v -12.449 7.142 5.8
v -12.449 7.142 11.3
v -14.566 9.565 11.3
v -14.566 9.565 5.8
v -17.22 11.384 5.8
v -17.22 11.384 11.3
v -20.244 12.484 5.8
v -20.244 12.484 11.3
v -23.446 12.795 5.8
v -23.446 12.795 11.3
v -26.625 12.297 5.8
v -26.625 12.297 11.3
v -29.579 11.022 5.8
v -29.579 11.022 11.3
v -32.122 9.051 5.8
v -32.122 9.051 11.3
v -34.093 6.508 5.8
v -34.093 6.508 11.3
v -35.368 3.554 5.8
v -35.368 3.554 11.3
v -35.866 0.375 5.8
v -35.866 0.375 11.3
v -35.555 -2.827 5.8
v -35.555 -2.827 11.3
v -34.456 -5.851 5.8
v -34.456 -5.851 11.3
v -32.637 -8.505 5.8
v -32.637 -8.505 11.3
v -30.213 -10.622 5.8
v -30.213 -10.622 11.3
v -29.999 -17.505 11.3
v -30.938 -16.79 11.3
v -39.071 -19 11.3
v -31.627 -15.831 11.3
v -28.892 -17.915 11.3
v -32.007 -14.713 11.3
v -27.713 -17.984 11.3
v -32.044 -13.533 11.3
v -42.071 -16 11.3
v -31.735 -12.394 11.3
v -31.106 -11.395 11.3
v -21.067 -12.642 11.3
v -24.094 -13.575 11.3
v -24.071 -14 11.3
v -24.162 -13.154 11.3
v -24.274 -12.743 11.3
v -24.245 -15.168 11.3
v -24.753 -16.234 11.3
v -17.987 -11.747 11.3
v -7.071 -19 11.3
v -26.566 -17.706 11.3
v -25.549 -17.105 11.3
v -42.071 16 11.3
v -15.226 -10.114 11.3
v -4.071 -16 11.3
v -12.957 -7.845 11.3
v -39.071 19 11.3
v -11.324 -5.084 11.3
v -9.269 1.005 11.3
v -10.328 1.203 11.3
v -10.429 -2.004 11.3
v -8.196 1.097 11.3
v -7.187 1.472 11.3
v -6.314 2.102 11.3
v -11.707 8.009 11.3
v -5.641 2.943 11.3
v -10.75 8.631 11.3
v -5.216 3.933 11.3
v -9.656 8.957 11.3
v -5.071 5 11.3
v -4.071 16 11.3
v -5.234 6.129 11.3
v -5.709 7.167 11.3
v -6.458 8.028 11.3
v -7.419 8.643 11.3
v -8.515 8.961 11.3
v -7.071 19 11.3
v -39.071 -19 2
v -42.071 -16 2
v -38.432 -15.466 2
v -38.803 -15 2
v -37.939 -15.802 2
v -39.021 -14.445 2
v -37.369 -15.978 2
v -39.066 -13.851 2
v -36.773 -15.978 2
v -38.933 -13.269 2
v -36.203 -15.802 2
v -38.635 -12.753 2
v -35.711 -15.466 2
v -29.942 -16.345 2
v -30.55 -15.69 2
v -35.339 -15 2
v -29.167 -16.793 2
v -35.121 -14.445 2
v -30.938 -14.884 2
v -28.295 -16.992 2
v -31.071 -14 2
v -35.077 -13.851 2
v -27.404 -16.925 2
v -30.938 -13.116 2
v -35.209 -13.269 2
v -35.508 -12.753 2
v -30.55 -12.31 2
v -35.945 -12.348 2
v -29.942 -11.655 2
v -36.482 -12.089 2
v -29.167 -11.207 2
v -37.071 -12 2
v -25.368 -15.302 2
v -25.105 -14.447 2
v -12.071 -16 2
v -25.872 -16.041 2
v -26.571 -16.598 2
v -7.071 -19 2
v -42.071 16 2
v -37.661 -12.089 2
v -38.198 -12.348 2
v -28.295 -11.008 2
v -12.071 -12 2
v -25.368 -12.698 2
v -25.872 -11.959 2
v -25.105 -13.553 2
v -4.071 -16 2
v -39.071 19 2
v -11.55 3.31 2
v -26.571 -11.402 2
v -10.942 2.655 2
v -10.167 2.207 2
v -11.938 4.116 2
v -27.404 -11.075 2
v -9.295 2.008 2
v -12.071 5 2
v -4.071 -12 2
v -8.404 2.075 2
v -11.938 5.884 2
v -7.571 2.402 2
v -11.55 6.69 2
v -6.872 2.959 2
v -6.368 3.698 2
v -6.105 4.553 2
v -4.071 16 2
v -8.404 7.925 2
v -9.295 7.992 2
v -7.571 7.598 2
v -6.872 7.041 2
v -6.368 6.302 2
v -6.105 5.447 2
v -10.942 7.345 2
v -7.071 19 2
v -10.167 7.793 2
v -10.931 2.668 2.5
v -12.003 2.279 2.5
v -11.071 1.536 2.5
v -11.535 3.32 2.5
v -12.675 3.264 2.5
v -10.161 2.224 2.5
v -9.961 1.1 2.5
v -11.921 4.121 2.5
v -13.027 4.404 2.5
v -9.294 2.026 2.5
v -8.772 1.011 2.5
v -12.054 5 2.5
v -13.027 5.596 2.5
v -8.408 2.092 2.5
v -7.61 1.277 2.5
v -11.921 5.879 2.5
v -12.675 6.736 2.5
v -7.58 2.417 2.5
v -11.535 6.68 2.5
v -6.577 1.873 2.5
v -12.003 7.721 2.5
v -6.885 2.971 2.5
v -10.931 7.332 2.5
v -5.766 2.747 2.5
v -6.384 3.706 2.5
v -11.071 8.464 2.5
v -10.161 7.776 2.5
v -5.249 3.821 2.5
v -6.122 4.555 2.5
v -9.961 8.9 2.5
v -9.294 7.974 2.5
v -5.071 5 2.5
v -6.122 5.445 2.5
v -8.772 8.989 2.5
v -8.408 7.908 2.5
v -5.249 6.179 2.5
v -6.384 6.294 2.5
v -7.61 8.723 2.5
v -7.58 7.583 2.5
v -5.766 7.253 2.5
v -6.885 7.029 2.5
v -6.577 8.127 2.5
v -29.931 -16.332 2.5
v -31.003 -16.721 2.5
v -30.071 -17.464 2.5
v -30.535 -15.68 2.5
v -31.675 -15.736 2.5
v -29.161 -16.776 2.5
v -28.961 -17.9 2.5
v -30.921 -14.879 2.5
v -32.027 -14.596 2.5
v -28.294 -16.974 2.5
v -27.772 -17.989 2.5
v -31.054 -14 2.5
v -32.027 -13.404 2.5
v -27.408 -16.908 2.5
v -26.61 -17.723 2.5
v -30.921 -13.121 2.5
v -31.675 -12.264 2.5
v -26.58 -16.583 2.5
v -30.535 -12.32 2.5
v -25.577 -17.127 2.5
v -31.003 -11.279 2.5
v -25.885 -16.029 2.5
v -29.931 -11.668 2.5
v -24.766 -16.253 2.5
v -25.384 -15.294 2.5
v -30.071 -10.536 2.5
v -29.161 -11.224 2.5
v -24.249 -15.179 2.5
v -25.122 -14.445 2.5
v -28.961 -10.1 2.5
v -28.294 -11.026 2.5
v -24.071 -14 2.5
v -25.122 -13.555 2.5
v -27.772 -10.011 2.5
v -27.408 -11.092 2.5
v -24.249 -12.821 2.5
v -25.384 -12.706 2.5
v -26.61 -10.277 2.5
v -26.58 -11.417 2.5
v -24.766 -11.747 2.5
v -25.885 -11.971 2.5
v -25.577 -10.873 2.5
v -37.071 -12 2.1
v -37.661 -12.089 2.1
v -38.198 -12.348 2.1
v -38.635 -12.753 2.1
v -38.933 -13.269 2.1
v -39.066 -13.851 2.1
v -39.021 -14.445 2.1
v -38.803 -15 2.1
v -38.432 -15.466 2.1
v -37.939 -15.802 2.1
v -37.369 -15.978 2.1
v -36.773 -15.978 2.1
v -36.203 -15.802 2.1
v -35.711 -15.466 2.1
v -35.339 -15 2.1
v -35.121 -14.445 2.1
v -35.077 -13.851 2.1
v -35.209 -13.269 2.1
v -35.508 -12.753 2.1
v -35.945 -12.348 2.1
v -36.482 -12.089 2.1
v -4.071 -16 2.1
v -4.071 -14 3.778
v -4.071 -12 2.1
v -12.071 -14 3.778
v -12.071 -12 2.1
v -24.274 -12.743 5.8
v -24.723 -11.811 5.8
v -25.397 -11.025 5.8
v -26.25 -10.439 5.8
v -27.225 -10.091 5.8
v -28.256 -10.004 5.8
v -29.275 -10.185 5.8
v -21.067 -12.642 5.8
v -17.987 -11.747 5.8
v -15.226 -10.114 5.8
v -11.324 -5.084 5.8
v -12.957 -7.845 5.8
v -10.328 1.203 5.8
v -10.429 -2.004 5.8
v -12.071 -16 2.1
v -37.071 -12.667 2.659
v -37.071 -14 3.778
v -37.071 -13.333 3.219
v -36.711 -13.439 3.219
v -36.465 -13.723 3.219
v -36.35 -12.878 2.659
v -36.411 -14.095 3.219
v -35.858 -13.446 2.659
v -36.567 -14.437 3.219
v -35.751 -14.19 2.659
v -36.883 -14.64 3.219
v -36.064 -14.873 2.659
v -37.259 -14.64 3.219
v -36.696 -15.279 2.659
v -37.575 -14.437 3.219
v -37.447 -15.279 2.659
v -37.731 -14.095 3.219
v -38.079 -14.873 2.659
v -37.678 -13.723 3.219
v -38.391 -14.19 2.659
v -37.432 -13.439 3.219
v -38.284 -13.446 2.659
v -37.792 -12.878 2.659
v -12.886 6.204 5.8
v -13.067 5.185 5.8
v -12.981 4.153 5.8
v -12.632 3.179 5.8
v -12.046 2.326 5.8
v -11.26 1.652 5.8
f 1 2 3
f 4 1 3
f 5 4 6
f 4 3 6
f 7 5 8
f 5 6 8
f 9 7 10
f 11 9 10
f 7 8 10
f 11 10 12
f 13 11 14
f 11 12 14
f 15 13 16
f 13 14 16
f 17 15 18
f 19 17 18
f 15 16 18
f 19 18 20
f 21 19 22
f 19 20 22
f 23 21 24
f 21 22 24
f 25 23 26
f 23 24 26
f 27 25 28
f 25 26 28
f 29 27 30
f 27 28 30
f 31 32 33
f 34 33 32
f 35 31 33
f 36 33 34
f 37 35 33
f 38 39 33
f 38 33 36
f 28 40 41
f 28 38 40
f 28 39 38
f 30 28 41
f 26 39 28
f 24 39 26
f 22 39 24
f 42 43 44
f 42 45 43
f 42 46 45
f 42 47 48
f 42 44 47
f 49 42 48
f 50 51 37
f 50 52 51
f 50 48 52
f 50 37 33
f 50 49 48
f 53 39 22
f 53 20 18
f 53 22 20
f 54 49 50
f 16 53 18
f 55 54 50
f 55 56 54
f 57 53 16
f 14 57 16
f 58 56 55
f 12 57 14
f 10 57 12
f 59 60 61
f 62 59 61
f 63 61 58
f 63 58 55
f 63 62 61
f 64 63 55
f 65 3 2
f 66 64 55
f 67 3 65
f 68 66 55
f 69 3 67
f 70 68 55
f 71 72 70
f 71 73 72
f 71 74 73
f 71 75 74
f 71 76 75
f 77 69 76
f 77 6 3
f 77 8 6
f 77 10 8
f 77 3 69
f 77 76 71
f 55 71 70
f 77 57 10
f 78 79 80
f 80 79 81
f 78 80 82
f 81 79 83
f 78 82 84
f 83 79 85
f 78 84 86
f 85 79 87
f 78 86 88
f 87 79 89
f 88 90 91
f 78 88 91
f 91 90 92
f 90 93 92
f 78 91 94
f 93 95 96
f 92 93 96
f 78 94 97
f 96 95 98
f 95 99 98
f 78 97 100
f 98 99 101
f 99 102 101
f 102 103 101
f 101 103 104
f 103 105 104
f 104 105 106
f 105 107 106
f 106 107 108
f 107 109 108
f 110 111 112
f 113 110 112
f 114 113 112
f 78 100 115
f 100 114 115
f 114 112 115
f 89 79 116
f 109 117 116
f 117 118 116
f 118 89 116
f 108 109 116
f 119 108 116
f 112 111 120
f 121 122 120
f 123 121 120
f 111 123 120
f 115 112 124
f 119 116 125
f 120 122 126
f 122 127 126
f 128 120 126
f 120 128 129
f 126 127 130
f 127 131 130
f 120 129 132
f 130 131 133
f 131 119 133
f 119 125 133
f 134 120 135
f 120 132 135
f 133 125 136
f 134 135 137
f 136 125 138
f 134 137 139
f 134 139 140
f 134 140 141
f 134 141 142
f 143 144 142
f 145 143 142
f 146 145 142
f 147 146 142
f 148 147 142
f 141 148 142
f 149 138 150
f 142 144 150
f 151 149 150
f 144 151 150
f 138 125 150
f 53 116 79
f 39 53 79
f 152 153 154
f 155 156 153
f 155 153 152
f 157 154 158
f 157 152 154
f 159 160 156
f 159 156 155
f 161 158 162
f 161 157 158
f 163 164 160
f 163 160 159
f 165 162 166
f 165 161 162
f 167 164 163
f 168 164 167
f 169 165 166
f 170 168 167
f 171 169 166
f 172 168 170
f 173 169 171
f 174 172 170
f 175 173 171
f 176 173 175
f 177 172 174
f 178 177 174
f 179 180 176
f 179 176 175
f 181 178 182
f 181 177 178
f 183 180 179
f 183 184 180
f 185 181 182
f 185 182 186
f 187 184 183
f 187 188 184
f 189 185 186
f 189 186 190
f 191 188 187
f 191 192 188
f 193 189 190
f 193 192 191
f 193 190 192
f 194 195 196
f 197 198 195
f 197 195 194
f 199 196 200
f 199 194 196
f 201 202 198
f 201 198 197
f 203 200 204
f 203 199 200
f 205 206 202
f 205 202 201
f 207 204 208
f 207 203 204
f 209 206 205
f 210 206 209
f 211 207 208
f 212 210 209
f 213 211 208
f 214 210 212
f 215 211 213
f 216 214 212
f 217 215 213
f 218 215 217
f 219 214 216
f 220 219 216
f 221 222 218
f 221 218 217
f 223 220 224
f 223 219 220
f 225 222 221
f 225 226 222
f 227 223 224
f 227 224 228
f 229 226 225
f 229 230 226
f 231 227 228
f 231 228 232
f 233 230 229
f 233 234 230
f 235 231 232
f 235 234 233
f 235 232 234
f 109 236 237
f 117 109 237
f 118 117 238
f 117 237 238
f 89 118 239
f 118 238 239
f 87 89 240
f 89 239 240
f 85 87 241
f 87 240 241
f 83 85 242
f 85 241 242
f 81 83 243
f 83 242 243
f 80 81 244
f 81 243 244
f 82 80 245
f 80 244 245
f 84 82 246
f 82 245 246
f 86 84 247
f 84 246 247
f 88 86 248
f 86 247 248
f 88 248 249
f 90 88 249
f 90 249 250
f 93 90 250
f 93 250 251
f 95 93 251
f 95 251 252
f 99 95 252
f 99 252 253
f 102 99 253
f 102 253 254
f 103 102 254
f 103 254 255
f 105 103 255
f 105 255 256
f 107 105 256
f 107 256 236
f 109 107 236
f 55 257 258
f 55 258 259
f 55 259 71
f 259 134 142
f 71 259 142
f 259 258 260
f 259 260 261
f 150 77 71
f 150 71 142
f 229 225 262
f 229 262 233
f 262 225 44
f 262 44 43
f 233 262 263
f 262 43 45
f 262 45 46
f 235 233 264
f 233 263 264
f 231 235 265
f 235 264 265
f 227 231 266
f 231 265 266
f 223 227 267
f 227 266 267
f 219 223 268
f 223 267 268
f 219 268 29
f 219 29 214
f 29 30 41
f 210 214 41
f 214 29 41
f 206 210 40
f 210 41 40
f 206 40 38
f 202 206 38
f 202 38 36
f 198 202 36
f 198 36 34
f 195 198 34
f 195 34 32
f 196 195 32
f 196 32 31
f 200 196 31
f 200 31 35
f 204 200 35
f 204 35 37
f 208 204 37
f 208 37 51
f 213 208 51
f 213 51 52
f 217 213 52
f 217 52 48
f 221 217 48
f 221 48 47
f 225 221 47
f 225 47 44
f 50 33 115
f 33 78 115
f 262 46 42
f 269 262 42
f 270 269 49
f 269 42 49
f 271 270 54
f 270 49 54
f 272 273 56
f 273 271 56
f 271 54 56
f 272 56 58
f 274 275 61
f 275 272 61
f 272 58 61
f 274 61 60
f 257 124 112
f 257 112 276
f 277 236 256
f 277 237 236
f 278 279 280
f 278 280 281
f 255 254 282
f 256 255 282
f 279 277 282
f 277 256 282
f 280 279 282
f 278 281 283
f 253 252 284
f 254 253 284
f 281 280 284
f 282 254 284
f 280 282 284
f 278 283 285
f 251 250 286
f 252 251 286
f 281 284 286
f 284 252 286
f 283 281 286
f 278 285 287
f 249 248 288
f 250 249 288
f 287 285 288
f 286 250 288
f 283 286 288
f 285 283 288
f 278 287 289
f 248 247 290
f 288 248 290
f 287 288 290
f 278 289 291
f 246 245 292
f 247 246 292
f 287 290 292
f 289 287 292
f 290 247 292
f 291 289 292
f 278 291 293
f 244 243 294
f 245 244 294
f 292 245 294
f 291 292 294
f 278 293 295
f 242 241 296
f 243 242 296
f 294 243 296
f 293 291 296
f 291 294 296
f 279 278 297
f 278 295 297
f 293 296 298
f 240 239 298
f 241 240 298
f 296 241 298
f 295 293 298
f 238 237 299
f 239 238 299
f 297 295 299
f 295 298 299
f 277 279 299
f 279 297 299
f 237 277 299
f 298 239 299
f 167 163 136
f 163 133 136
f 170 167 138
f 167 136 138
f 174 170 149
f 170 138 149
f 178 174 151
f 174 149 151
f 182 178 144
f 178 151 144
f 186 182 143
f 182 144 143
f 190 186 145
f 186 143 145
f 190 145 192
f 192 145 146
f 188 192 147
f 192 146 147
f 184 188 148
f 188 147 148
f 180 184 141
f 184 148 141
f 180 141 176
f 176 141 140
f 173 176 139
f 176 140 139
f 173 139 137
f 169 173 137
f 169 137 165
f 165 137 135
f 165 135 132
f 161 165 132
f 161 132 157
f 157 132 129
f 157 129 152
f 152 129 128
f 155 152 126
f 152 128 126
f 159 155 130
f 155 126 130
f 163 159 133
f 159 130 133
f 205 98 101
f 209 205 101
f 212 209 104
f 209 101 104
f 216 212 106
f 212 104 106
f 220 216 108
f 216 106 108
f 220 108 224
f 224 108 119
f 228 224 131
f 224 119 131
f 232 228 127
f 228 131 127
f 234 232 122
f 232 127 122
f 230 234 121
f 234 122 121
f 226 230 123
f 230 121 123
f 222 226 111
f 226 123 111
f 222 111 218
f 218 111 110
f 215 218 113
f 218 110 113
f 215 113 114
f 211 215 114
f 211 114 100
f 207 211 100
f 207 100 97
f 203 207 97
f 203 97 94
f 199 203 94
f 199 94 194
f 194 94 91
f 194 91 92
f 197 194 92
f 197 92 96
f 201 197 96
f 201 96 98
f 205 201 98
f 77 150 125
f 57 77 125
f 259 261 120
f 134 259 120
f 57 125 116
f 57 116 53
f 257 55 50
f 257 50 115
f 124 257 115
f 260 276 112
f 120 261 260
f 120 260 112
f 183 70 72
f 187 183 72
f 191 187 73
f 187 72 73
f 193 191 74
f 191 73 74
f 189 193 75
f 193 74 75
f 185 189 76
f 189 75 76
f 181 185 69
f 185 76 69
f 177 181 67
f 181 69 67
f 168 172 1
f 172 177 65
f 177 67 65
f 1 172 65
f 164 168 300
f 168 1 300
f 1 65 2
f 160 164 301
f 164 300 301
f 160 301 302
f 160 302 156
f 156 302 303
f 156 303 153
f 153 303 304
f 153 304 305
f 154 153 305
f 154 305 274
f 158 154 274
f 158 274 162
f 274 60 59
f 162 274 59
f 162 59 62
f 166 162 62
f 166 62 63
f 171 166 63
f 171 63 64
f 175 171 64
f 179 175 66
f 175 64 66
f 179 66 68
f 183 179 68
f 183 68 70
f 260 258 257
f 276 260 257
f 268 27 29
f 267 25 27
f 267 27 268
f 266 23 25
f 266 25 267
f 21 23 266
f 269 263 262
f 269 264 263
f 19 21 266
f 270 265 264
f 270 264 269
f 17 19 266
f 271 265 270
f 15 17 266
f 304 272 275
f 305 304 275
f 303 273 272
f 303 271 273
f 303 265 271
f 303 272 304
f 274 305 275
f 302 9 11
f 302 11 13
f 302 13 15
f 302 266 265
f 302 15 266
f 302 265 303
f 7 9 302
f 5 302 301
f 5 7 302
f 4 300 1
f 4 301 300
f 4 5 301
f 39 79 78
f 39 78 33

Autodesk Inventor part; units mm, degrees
ref_plane "YZ Plane" through (0, 0, 0) normal (1, 0, 0) x (0, 1, 0)
ref_plane "XZ Plane" through (0, 0, 0) normal (0, 1, 0) x (-1, 0, 0)
ref_plane "XY Plane" through (0, 0, 0) normal (0, 0, 1) x (1, 0, 0)
ref_plane "Work Plane1" through (0, 0, 2) normal (0, 0, 1) x (1, 0, 0)
sketch "Sketch1" plane through (0, 0, 2) normal (0, 0, 1) x (1, 0, 0)
  line L0 (-37.0712, 14) -> (-9.0712, 14) construction
  line L1 (-9.0712, 14) -> (-9.0712, -14) construction
  line L2 (-9.0712, -14) -> (-37.0712, -14) construction
  line L3 (-37.0712, -14) -> (-37.0712, 14) construction
  line L4 (-4.0712, -19) -> (-4.0712, 19)
  line L5 (-4.0712, 19) -> (-42.0712, 19)
  line L6 (-42.0712, 19) -> (-42.0712, -19)
  line L7 (-42.0712, -19) -> (-4.0712, -19)
  circle A0 centre (-23.0712, 0) radius 12.8
  point P0 (0, 0)
  dimension "d0" = 5
extrude "Extrusion1" add sketch "Sketch1" along normal blind 9.3 contours L7 L6 L5 L4 | A0
sketch "Sketch3" plane through (0, 0, 2) normal (0, 0, -1) x (-1, 0, 0)
  circle A0 centre (9.0712, -14) radius 1.45 construction
  circle A1 centre (9.0712, -14) radius 2.45
  circle A2 centre (37.0712, -14) radius 1.45 projected
  circle A3 centre (37.0712, -14) radius 1.95
  point P0 (0, 0)
  dimension "d8" = 1
  dimension "d10" = 0.5
chamfer "Chamfer1" distance 3 angle 45 4 edges at (-42.0712, 19, 6.65) (-4.0712, 19, 6.65) (-4.0712, -19, 6.65) (-42.0712, -19, 6.65)
hole "Hole1" at (-37.0712, -14, 2) direction (0, 0, 1) diameter 4 depth 0.1 tip angle 100
sketch "Sketch4" plane through (-4.0712, -19, 2) normal (1, 0, 0) x (0, 0, -1)
  line L0 (2, 4.45) -> (6, 4.45)
  line L1 (2, 1.55) -> (6, 1.55)
  line L2 (0, 0) -> (0, 38) projected
  arc A0 (2, 19) -> (2, 19) centre (1.5, 4.4206) ccw projected
  line L3 (-1.7782, 5) -> (-0.1, 7) projected
  line L4 (-1.7782, 5) -> (-0.1, 3) projected
  line L5 (-0.1, 7) -> (0.6045, 7)
  line L6 (0.6045, 7) -> (0.6045, 3)
  line L7 (0.6045, 3) -> (-0.1, 3)
  line L8 (-0.1, 3) -> (-0.1, 7)
extrude "Extrusion4" cut sketch "Sketch4" against normal blind 8 contours L7 L8 L5 L2 | L2 L5 L6 L7 | L4 L3 L8
ref_plane "Arbeitsebene2" through (-23.0712, -12, 2) normal (1, 0, 0) x (0, 0, -1)
ref_plane "Arbeitsebene3" through (-39.0712, 0, 2) normal (0, -1, 0) x (1, 0, 0)
sketch "Skizze9" plane through (0, 0, 2) normal (0, 0, -1) x (-1, 0, 0)
  line L0 (12.0712, -16) -> (4.0712, -16) projected
  line L1 (7.0712, -19) -> (4.0712, -16) projected
  line L2 (39.0712, -19) -> (7.0712, -19) projected
  line L3 (42.0712, -16) -> (39.0712, -19) projected
  line L4 (42.0712, 16) -> (42.0712, -16) projected
  line L5 (39.0712, 19) -> (42.0712, 16) projected
  line L6 (7.0712, 19) -> (39.0712, 19) projected
  line L7 (4.0712, 16) -> (7.0712, 19) projected
  line L8 (4.0712, -12) -> (4.0712, 16) projected
  line L9 (4.0712, -12) -> (12.0712, -12) projected
  line L10 (12.0712, -12) -> (12.0712, -16) projected
  circle A0 centre (37.0712, -14) radius 2 projected
  circle A1 centre (28.0712, -14) radius 3
  circle A2 centre (9.0712, 5) radius 3
  point P0 (0, 0)
  dimension "d54" = 6
  dimension "d55" = 6
  dimension "d56" = 14
  dimension "d57" = 5
  dimension "d58" = 5
  dimension "d59" = 14
extrude "Extrusion9" cut sketch "Skizze9" against normal blind 3 draft -2 contours A1 | A2
sketch "Skizze10" plane through (0, 0, 11.3) normal (0, 0, 1) x (1, 0, 0)
  circle A0 centre (-9.0712, 5) radius 4.05 projected
  circle A1 centre (-28.0712, -14) radius 4.55 projected
  circle A2 centre (-9.0712, 5) radius 4
  circle A3 centre (-28.0712, -14) radius 2.8952 projected
  circle A4 centre (-28.0712, -14) radius 4
  point P0 (0, 0)
  dimension "d62" = 8
  dimension "d63" = 8
extrude "Extrusion10" cut sketch "Skizze10" against normal blind 8.8 contours A2 | A3 | A4
sketch "Sketch11" plane through (0, 0, 11.3) normal (0, 0, 1) x (1, 0, 0)
  circle A0 centre (-23.0712, 0) radius 12.8
  line L0 (-39.0712, -19) -> (-7.0712, -19) projected
  line L1 (-42.0712, 16) -> (-42.0712, -16) projected
  point P0 (0, 0)
  point P1 (-23.0712, -19)
  point P2 (-42.0712, 0)
  dimension "d66" = 25.6
extrude "Extrusion11" cut sketch "Sketch11" against normal blind 5.5
equation "\"d54\" = d55"
equation "\"d59\" = d56"
properties part number "20_Cube_Insert_Kinematic_Astromedia_30x40x1_45_pro_magnetic"
